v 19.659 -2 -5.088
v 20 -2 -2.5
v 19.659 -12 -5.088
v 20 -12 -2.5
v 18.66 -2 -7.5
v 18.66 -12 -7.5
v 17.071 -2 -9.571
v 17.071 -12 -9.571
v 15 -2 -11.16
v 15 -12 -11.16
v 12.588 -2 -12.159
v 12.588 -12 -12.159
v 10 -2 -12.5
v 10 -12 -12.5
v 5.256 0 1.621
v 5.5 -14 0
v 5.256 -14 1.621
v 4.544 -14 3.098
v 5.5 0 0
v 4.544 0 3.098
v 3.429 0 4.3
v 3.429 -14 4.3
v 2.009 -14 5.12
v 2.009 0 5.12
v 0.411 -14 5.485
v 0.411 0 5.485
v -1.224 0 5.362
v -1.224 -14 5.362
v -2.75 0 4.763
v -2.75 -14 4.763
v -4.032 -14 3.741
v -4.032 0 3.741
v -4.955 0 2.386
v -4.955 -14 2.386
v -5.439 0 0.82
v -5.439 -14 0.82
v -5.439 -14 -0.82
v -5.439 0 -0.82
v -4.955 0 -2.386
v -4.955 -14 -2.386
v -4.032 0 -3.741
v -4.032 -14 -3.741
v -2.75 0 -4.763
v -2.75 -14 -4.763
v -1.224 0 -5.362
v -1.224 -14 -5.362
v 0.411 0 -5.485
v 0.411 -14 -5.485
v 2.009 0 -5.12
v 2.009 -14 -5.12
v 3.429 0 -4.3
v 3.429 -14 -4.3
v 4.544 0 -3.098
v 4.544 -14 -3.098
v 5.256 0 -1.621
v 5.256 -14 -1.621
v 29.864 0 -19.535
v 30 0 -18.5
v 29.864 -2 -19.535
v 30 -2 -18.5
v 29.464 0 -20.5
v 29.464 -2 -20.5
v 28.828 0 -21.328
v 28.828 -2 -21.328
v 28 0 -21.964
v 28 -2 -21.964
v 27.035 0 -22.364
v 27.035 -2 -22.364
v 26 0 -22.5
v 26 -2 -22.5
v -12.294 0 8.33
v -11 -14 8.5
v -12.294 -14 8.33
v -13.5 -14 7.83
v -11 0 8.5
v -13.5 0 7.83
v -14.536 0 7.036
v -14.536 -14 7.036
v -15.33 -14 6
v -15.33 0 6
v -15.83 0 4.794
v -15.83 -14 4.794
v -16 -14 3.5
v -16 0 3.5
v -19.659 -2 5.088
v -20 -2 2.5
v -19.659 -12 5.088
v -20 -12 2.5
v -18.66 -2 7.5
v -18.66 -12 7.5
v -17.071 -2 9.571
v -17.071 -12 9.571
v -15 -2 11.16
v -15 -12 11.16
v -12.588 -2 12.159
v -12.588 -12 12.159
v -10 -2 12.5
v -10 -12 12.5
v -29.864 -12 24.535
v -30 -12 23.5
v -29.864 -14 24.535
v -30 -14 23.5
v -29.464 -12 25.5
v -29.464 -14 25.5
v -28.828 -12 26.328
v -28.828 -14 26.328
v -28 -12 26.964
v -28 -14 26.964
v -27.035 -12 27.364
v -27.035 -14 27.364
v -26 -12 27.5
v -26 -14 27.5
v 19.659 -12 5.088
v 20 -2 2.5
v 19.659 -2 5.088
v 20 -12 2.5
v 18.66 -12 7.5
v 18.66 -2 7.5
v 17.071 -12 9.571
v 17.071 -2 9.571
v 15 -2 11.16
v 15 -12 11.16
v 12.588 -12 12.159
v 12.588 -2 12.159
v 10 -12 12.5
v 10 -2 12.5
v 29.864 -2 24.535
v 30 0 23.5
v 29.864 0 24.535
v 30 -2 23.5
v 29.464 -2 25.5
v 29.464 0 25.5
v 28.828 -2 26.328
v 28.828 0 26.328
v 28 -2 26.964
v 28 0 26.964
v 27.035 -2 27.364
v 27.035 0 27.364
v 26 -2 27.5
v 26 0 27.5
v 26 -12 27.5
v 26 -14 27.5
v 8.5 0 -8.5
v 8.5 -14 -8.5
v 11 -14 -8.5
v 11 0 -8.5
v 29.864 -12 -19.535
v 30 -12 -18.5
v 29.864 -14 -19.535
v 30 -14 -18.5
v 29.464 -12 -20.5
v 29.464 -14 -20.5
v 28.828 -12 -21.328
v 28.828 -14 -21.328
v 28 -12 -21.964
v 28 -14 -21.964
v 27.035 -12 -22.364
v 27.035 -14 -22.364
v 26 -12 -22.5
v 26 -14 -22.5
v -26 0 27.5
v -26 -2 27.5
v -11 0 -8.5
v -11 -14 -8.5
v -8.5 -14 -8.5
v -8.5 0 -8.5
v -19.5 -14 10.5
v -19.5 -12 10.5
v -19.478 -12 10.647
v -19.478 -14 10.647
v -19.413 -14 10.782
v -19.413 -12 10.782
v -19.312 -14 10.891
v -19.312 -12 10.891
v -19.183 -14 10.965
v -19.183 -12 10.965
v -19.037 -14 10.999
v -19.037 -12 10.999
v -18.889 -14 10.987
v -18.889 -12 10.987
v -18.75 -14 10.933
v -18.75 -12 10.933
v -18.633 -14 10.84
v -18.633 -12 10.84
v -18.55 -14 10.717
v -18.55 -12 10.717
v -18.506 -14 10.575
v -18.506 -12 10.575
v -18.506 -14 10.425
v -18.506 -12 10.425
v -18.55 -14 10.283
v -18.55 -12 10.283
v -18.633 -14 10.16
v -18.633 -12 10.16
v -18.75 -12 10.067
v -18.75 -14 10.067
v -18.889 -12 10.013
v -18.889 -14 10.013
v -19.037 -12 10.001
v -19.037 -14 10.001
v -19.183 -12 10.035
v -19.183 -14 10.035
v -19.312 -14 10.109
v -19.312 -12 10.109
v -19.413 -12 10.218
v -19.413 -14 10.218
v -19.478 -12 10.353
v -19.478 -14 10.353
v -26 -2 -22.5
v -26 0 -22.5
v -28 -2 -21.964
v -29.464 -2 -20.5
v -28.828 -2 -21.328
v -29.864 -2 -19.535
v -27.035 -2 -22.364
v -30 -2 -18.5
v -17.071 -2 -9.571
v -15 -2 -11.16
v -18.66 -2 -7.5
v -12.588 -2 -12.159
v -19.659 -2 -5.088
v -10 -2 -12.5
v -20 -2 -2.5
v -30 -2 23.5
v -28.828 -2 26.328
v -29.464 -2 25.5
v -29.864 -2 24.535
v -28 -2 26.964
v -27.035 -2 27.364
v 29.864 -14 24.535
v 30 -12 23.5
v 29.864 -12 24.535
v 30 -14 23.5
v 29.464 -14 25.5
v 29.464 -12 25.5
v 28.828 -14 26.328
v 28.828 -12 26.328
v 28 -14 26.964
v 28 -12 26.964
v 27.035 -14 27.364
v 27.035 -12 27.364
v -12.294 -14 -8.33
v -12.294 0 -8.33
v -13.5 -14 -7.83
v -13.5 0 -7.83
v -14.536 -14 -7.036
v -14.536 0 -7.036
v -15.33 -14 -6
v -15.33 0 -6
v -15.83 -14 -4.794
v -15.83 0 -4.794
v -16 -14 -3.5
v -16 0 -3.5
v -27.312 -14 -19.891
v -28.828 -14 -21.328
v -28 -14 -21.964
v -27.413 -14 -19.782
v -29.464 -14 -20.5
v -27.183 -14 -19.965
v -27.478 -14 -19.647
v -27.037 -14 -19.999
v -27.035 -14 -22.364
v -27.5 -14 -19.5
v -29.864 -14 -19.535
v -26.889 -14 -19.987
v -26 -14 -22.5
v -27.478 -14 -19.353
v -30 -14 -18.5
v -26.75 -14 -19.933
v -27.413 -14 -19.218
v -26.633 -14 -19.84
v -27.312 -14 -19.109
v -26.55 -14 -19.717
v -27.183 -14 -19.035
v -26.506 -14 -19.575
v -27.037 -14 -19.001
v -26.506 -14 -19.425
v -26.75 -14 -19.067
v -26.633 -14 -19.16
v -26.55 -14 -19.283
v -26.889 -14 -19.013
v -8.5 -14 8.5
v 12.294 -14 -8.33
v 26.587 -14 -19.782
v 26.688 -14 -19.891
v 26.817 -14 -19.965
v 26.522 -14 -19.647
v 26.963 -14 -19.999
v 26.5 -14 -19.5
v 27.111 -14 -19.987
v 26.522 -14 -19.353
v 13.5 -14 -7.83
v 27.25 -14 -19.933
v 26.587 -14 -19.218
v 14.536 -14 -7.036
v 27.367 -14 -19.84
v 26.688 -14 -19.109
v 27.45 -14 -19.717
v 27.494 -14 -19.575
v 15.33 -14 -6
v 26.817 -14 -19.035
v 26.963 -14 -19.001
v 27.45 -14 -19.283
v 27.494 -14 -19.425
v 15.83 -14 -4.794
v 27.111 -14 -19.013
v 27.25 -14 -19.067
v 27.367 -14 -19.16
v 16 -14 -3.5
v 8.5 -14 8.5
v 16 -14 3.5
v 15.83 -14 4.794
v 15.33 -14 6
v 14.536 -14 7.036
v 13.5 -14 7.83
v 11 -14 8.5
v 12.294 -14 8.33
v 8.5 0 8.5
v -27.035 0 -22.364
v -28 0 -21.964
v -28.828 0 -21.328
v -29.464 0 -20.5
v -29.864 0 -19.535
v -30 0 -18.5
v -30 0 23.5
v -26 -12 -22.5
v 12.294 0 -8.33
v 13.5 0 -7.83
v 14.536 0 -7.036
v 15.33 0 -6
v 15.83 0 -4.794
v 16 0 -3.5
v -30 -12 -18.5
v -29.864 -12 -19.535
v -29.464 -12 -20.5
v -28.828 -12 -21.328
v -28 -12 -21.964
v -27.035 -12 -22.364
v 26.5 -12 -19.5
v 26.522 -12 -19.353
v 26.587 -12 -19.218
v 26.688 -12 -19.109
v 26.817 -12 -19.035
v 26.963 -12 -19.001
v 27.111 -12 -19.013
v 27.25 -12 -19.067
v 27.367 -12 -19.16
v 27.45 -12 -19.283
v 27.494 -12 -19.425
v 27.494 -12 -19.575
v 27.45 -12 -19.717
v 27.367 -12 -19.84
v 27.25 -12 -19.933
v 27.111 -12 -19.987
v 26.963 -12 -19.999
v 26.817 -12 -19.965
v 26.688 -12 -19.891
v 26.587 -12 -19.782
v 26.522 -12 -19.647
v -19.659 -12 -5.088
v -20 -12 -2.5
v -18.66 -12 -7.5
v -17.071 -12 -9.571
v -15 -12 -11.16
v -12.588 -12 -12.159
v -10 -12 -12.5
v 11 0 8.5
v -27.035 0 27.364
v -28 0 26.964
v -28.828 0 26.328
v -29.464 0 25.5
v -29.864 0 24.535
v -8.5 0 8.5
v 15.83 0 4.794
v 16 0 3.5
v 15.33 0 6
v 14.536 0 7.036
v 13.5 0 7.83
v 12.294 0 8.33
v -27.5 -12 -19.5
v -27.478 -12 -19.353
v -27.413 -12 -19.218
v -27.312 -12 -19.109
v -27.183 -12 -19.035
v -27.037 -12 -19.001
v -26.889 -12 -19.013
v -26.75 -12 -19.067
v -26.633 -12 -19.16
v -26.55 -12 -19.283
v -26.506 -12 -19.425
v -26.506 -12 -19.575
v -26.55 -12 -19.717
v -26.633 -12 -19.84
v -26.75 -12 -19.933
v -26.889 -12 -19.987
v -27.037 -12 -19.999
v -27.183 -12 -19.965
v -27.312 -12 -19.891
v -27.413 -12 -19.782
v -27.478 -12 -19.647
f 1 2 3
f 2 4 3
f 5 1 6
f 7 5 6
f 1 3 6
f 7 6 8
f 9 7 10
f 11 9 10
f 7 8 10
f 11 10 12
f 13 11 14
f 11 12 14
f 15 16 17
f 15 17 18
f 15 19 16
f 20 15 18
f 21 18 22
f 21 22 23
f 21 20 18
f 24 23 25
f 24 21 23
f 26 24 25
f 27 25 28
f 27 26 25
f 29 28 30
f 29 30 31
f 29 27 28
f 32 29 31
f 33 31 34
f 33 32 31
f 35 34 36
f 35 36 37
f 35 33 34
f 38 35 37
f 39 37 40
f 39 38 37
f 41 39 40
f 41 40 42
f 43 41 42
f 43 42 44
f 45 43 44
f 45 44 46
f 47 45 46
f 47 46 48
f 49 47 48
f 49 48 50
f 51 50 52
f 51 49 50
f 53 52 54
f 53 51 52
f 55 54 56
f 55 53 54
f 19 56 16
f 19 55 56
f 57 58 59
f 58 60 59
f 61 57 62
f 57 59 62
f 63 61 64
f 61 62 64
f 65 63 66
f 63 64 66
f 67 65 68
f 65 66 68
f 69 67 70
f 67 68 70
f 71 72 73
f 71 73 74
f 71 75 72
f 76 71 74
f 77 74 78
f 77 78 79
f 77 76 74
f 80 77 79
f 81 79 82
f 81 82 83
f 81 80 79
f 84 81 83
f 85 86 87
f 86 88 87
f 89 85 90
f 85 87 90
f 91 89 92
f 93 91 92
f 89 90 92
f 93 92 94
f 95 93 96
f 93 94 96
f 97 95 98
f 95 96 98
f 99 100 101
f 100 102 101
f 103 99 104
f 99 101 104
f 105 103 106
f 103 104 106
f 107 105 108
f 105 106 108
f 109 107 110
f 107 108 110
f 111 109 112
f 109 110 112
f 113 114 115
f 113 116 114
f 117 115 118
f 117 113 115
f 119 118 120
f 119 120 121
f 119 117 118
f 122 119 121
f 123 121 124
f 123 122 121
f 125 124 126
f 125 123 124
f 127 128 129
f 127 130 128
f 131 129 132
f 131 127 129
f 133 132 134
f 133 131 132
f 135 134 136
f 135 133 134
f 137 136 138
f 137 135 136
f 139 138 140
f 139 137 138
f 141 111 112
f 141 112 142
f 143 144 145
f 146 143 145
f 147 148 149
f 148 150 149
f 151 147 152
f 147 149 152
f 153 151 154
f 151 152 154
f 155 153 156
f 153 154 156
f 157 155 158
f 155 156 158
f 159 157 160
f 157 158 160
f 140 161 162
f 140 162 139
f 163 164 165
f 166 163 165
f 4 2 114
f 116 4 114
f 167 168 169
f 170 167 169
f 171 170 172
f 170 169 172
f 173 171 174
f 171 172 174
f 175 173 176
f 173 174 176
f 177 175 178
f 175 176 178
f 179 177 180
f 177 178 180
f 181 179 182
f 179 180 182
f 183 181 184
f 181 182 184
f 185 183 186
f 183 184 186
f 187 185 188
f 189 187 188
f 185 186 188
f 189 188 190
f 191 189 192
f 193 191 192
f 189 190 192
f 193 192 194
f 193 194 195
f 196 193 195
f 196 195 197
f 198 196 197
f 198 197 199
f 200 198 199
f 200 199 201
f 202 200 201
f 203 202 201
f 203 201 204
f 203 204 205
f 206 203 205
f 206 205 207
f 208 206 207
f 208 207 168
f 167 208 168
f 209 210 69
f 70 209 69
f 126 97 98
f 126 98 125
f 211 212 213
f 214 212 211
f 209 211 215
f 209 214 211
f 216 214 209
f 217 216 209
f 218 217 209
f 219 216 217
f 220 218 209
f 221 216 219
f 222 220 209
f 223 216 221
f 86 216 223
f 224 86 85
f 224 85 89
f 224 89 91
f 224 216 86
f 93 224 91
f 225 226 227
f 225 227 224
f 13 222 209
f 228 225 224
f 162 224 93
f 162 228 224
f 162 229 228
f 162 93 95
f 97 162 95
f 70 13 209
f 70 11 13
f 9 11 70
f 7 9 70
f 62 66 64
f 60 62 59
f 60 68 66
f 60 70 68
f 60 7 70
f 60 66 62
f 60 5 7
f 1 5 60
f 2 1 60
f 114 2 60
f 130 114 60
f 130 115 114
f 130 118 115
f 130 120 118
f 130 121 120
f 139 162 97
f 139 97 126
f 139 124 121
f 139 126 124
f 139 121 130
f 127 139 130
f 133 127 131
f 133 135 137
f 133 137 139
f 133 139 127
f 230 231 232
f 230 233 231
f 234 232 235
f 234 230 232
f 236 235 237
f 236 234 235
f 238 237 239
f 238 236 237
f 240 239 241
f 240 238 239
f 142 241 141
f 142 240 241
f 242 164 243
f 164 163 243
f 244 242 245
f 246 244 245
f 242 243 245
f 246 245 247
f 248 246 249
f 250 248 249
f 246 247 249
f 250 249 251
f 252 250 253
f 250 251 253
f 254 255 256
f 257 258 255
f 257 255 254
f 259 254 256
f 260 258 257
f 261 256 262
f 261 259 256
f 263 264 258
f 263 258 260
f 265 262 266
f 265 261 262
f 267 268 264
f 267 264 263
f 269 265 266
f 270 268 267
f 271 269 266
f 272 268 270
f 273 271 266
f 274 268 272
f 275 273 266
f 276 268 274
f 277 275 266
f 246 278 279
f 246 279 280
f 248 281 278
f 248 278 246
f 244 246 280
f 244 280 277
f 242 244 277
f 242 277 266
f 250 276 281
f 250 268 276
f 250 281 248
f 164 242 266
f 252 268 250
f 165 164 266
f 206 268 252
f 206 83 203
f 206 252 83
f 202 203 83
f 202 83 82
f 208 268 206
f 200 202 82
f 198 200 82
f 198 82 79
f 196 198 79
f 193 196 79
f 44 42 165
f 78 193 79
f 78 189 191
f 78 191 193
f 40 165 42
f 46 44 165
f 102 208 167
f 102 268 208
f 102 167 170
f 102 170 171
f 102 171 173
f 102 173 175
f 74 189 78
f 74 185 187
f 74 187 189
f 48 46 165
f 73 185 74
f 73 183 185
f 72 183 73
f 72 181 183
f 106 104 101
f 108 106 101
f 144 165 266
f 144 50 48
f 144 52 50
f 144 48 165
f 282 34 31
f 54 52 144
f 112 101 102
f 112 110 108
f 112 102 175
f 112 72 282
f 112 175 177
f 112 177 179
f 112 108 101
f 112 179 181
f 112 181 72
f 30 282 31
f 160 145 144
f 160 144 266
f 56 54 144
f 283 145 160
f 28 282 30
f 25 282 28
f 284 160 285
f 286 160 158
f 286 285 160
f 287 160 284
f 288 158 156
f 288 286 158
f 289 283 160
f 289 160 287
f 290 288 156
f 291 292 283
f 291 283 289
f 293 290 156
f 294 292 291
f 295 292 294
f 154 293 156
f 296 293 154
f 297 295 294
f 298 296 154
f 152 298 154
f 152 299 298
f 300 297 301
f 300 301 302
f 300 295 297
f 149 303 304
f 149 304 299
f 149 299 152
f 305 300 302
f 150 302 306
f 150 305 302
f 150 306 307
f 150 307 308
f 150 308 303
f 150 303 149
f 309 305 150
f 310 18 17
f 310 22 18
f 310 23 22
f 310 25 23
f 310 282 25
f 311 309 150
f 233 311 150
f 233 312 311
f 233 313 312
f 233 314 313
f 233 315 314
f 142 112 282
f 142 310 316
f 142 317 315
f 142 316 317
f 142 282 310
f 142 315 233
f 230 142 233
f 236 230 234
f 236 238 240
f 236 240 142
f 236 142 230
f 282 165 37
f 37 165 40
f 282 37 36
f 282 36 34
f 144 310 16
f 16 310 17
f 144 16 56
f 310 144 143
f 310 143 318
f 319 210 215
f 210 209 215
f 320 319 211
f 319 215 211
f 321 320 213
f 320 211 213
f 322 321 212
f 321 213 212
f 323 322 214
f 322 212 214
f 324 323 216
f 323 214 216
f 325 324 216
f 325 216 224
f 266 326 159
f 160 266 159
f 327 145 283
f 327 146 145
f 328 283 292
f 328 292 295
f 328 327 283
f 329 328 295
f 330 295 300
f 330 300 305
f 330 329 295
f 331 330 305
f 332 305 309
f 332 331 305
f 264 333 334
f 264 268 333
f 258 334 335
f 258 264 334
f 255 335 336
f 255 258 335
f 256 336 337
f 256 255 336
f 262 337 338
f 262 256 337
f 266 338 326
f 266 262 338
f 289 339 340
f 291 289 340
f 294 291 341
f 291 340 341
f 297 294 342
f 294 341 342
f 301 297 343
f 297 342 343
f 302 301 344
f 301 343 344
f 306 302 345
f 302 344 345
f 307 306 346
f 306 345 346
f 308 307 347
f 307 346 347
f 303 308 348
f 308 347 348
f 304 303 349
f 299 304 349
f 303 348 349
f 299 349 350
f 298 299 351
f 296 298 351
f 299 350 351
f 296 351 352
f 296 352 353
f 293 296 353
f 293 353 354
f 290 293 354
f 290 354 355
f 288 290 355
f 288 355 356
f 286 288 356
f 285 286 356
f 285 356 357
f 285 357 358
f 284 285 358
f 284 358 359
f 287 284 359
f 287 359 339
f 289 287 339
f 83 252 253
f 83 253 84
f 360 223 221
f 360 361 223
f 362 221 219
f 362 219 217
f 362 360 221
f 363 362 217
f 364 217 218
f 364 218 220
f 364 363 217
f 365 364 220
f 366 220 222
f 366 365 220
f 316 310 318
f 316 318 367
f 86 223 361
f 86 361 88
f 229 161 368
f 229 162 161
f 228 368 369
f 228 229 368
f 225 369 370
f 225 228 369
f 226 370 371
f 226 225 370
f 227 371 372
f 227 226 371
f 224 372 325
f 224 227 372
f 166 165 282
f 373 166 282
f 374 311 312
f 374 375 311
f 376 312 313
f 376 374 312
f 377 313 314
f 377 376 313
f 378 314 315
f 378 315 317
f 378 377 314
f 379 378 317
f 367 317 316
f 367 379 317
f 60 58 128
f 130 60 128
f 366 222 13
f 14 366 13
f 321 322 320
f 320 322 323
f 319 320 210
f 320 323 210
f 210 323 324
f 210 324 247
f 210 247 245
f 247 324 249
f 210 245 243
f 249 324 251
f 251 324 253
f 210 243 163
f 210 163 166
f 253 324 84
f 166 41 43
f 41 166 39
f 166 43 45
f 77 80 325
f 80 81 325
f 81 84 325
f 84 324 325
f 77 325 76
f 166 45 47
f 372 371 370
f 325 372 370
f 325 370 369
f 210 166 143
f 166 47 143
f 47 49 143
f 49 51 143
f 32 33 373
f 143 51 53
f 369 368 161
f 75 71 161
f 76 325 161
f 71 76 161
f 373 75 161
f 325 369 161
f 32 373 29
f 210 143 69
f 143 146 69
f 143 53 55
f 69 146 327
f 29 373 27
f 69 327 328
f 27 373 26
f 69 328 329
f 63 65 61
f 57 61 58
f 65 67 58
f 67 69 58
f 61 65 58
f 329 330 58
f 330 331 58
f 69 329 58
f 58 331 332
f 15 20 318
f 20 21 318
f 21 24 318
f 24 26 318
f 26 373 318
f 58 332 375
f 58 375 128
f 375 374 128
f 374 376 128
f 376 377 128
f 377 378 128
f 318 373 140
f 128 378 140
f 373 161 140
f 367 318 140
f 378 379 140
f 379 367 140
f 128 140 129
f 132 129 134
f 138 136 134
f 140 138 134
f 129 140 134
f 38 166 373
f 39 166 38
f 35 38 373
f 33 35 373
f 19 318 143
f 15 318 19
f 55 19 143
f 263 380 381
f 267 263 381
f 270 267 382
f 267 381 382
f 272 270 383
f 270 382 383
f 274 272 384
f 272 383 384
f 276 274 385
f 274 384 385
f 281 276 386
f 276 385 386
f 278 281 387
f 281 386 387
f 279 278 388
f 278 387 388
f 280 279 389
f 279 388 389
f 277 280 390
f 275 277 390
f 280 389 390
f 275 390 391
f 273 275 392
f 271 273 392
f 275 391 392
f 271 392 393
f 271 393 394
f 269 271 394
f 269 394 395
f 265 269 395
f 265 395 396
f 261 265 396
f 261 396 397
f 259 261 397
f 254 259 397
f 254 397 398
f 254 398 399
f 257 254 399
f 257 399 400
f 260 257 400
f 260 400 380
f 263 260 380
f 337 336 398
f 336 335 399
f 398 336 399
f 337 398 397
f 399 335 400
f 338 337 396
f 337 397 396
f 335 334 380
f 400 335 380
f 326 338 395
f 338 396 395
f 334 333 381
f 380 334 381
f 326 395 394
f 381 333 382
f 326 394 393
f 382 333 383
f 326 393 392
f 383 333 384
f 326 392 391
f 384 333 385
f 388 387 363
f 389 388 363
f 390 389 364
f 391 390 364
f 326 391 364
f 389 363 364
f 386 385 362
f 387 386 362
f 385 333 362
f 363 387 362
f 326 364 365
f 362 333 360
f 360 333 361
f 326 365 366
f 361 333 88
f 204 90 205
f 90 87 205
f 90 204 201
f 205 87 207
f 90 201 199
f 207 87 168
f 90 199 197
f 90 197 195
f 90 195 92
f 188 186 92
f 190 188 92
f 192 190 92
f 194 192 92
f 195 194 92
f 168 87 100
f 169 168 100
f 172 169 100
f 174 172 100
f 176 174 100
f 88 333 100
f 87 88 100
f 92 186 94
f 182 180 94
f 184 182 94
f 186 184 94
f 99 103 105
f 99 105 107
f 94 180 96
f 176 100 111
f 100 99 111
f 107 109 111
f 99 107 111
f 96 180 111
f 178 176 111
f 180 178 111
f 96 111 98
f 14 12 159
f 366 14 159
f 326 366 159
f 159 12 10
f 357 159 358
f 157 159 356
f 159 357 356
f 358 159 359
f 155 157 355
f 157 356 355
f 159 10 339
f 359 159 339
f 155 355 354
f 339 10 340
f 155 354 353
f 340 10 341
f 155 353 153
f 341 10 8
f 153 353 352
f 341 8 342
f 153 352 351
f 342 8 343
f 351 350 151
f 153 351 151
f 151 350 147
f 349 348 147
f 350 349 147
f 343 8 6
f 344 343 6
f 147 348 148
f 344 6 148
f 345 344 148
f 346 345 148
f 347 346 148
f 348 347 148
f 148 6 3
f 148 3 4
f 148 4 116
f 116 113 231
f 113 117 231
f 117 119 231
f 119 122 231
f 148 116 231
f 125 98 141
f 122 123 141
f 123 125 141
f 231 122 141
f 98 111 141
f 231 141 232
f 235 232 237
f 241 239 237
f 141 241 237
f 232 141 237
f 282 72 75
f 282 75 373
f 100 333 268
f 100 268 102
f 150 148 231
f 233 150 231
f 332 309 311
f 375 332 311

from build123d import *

# Parameters (mm, degrees)
F0_W      = 60
F0_H      = 50
F0_R      = 5.5
F1_DEPTH  = 2
F2_W      = 40
F2_H      = 25
F2_R      = 5.5
F3_DEPTH  = 10
F4_R      = 10
F5_W      = 60
F5_H      = 50
F5_R      = 5.5
F6_DEPTH  = 2
F7_R      = 4
F9_D      = 1
F9_DEPTH  = 3
F9_TIP    = 0.3004303095
F10_W     = 7.5
F10_H     = 17
F11_DEPTH = 25
F12_R     = 5


# Not quite as in the source:
# - a feature names something its author has since deleted; it is built from what else it names


with BuildPart() as f1:
    # F0 (on Front) → F1 (new body)
    with BuildSketch(Plane.XZ):
        with Locations((0, 2.5)):
            Rectangle(F0_W, F0_H)
        Circle(F0_R, mode=Mode.SUBTRACT)
    extrude(amount=F1_DEPTH)

    # F2 (on face) → F3 (join)
    with BuildSketch(Plane.XZ.offset(2)):
        Rectangle(F2_W, F2_H)
        Circle(F2_R, mode=Mode.SUBTRACT)
    extrude(amount=F3_DEPTH)

    # F4
    f4_edges = [f1.edges().sort_by_distance(p)[0] for p in [
        (20, -7, 12.5),
        (20, -7, -12.5),
        (-20, -7, -12.5),
        (-20, -7, 12.5),
    ]]
    fillet(f4_edges, radius=F4_R)

    # F5 (on face) → F6 (join)
    with BuildSketch(Plane.XZ.offset(12)):
        with Locations((0, 2.5)):
            Rectangle(F5_W, F5_H)
        Circle(F5_R, mode=Mode.SUBTRACT)
    extrude(amount=F6_DEPTH)

    # F7
    f7_edges = [f1.edges().sort_by_distance(p)[0] for p in [
        (30, -13, 27.5),
        (30, -1, 27.5),
        (30, -13, -22.5),
        (30, -1, -22.5),
        (-30, -13, -22.5),
        (-30, -1, -22.5),
        (-30, -13, 27.5),
        (-30, -1, 27.5),
    ]]
    fillet(f7_edges, radius=F7_R)

    # F9
    with Locations(Plane.XZ.offset(14)):
        with Locations((-19, 10.5), (-27, -19.5), (27, -19.5)):
            Hole(F9_D / 2, depth=F9_DEPTH)
            with Locations((0, 0, -(F9_DEPTH + F9_TIP / 2))):  # 118° drill point
                Cone(0, F9_D / 2, F9_TIP, mode=Mode.SUBTRACT)

    # F10 (on face) → F11 (cut)
    with BuildSketch(Plane.XZ.offset(14)):
        with Locations((-12.25, 0)):
            Rectangle(F10_W, F10_H)
        with Locations((12.25, 0)):
            Rectangle(F10_W, F10_H)
    extrude(amount=-F11_DEPTH, mode=Mode.SUBTRACT)

    # F12
    f12_edges = [f1.edges().sort_by_distance(p)[0] for p in [
        (16, -7, -8.5),
        (16, -7, 8.5),
        (-16, -7, 8.5),
        (-16, -7, -8.5),
    ]]
    fillet(f12_edges, radius=F12_R)


solid = f1.part
